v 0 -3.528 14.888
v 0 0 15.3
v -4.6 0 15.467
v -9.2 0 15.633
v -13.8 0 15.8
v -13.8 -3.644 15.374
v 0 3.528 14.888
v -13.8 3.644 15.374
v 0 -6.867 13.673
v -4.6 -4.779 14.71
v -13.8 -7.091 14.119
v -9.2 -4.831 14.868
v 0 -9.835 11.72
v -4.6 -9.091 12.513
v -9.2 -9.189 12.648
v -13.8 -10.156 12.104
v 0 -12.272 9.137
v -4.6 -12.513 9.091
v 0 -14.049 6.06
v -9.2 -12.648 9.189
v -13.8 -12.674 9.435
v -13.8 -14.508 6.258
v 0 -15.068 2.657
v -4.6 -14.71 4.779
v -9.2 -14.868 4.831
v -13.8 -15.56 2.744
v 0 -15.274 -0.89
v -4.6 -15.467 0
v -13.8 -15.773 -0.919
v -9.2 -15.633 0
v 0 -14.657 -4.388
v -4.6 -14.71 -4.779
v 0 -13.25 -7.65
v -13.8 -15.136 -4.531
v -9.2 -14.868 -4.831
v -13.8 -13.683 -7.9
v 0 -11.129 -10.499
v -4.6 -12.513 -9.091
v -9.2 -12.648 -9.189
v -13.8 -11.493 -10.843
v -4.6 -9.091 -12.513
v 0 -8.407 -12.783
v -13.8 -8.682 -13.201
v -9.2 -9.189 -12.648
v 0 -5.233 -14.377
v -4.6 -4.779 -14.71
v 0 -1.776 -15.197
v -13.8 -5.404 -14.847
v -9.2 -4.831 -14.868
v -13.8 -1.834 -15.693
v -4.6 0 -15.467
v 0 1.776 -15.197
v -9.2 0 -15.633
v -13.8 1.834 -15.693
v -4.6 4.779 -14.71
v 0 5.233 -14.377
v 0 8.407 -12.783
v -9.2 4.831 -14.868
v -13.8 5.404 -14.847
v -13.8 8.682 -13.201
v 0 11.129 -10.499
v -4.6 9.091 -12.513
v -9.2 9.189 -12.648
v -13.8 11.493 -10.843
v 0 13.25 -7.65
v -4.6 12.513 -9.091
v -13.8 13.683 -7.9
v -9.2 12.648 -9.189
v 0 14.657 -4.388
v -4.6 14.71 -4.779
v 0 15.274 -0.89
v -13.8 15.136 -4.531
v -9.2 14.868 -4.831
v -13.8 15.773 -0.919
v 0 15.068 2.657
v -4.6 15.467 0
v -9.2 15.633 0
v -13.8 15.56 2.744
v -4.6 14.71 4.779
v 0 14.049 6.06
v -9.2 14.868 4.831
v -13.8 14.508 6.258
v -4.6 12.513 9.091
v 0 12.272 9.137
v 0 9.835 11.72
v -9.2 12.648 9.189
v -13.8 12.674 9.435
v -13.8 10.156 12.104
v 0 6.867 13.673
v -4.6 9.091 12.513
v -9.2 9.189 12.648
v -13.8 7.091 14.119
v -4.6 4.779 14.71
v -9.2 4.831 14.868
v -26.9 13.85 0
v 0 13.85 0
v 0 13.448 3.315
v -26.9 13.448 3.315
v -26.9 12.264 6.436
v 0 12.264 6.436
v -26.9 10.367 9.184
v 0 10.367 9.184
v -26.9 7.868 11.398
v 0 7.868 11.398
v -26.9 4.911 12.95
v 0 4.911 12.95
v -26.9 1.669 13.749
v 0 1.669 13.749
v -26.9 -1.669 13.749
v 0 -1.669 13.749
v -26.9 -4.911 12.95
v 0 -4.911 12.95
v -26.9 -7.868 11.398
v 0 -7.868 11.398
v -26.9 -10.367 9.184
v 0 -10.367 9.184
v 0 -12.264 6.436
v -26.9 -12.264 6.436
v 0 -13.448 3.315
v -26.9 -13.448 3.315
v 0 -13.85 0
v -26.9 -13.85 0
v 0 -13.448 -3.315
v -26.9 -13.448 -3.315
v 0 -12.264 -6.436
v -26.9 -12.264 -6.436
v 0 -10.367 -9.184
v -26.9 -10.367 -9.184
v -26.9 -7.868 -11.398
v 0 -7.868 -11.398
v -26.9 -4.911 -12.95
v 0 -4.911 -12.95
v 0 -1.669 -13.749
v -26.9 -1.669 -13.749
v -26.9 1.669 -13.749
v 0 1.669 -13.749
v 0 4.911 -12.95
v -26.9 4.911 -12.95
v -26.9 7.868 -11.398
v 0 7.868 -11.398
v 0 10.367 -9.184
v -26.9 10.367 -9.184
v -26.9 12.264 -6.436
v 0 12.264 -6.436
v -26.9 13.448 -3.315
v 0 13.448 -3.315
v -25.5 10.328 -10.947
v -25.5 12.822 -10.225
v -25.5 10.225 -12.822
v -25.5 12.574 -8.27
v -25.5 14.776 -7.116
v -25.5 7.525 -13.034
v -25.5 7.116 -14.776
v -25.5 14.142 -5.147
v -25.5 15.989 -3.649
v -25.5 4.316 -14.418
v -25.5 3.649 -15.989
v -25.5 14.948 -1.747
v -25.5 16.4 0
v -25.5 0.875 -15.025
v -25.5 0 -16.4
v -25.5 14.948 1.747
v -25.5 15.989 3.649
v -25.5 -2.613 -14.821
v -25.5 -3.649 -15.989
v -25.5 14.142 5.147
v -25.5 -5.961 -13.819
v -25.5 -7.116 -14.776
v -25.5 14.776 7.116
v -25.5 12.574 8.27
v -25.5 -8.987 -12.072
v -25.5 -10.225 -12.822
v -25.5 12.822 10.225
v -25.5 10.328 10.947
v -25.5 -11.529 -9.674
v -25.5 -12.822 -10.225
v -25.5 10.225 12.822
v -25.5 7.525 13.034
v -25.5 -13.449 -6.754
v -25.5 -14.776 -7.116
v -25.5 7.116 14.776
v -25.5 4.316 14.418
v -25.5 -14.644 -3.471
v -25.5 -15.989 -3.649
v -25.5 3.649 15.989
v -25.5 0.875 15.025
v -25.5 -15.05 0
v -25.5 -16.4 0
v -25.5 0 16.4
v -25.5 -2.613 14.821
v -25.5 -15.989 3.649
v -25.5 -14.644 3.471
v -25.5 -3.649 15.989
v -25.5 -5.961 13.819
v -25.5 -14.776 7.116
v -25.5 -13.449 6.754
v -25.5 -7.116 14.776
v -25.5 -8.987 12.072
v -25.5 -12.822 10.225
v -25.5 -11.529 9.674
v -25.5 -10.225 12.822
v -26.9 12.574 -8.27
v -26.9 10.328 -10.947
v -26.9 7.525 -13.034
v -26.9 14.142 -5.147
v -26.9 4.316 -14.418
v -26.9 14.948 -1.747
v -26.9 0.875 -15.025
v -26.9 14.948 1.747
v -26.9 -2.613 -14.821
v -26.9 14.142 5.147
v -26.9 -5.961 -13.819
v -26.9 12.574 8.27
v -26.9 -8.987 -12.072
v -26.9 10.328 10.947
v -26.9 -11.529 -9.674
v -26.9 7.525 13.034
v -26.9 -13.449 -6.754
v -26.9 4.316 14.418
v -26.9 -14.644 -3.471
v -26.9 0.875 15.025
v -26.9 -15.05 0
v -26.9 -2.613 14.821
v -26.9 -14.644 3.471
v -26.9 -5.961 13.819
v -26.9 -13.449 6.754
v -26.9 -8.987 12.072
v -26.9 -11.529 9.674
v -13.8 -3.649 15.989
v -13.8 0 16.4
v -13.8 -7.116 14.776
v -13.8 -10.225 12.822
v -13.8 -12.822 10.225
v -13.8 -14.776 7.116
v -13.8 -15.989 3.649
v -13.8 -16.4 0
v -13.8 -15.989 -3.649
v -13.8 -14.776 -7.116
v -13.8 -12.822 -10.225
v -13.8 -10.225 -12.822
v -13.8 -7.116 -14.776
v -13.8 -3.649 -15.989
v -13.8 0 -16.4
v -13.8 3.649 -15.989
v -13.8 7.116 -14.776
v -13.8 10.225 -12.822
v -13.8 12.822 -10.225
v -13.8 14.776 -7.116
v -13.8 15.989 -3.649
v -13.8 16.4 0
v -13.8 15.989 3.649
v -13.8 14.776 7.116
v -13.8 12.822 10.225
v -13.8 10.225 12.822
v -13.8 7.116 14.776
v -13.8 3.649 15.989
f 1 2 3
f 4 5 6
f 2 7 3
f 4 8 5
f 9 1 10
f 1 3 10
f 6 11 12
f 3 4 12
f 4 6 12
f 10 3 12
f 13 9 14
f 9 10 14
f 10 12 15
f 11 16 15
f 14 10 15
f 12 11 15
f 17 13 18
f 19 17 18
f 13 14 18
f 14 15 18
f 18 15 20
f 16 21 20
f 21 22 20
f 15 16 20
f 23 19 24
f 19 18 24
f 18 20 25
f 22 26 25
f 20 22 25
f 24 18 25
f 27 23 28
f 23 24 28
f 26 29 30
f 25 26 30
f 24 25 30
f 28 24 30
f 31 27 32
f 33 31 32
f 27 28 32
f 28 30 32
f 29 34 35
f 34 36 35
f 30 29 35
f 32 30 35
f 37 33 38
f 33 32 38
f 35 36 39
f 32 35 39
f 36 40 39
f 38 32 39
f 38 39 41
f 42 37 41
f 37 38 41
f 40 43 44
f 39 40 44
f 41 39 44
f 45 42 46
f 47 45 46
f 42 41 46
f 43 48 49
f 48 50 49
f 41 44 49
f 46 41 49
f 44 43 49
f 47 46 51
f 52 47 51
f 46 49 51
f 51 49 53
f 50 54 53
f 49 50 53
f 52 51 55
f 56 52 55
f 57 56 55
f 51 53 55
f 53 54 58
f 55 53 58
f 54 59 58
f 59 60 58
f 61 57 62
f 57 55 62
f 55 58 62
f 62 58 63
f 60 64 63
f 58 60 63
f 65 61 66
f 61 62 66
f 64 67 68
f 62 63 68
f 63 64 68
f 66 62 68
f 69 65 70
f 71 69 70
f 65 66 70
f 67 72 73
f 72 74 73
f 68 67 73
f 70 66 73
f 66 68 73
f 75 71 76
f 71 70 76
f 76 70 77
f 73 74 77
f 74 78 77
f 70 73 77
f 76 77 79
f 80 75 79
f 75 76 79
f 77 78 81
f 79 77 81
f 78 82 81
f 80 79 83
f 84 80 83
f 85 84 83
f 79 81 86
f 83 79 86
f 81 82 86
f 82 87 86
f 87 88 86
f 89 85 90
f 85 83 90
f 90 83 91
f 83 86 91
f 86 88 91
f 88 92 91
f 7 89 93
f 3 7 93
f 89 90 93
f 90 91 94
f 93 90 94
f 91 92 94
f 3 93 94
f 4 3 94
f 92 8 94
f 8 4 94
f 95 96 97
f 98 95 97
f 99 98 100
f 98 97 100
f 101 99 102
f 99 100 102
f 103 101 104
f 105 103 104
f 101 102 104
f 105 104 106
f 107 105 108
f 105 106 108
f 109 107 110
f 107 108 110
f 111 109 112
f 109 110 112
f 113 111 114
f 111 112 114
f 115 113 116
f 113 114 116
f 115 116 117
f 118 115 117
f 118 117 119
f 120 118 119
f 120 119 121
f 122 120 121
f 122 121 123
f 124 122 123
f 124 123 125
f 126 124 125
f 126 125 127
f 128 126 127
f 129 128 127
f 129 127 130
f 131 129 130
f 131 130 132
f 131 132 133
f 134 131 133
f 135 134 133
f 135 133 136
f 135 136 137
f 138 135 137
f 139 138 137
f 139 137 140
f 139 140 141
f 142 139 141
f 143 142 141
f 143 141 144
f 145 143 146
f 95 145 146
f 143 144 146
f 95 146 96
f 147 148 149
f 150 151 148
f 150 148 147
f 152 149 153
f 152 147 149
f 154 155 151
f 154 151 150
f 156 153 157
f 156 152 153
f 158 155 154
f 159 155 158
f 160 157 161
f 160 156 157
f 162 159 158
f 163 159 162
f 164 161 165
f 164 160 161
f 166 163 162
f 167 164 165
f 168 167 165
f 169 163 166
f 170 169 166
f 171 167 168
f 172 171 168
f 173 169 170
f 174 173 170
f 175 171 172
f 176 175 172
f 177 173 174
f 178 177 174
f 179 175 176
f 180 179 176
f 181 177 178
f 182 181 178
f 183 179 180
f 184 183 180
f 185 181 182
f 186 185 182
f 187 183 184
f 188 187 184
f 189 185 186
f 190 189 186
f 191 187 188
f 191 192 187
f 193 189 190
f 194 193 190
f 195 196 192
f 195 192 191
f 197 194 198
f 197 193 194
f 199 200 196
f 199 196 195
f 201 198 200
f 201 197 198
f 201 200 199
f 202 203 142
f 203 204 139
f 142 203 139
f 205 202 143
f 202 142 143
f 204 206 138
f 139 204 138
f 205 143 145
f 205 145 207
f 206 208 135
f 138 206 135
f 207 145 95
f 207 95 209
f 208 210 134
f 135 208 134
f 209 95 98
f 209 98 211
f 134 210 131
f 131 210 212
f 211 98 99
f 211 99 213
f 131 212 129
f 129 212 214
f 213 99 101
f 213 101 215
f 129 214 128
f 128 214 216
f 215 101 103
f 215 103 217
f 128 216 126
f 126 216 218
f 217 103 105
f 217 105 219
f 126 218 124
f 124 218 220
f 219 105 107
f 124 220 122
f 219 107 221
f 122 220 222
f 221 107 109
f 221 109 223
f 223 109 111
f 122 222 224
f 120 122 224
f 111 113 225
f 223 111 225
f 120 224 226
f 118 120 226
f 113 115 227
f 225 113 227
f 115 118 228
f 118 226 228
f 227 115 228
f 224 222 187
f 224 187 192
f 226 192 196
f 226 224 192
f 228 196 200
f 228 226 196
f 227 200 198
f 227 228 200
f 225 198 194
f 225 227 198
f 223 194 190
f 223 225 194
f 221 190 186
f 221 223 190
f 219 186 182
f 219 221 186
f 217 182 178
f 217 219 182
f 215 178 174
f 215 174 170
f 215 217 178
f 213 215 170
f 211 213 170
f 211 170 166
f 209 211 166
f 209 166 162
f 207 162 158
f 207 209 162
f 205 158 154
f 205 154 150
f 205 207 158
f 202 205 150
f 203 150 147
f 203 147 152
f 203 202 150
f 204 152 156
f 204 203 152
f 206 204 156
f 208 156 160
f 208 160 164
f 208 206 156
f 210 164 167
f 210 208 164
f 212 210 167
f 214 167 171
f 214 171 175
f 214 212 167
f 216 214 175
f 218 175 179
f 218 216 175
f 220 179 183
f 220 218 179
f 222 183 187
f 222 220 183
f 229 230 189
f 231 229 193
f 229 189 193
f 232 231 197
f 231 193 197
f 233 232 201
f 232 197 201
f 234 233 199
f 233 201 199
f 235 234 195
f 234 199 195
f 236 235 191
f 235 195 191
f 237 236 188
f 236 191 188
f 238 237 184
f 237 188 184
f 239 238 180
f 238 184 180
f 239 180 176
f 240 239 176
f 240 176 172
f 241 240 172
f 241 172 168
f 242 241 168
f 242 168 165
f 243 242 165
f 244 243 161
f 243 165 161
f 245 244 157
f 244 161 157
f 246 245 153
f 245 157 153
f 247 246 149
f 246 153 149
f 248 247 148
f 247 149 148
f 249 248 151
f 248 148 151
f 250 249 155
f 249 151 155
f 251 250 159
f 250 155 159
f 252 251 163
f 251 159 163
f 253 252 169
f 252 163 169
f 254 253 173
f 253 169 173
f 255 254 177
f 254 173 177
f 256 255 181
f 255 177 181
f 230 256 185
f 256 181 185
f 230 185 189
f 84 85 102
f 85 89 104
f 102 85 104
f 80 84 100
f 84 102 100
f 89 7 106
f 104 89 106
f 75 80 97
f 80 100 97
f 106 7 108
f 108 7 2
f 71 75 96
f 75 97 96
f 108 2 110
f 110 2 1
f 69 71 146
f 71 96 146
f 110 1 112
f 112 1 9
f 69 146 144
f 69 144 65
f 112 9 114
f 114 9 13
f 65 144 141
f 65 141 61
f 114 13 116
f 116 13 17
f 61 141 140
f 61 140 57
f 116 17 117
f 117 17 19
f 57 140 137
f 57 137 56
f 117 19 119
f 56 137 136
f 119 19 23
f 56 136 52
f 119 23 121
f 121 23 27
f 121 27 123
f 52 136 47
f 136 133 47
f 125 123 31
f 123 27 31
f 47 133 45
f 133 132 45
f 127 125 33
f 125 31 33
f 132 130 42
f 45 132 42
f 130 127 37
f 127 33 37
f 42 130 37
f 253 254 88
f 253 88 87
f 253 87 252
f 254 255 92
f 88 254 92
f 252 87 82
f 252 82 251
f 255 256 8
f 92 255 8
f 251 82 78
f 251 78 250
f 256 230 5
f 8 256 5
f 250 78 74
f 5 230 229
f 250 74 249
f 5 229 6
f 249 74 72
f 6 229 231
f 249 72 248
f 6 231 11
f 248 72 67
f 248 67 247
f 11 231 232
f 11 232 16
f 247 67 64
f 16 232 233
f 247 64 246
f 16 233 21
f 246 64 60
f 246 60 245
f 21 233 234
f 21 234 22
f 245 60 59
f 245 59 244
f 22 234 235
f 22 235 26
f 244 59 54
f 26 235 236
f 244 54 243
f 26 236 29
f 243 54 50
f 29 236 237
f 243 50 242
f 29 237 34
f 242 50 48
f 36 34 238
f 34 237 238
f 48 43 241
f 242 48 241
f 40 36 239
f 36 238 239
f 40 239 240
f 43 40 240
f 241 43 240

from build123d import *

# Parameters (mm, degrees)
F2_R     = 13.85
F3_DEPTH = 26.901
F4_R     = 16.4
F4_R_2   = 15.05
F5_DEPTH = 1.4


with BuildPart() as f1:
    # F0 (on Front) → F1 (revolve)
    with BuildSketch(Plane.XZ):
        Polygon((-13.8, 16.4), (-26.9, 16.4), (-26.9, 0), (-13.8, 0), (-13.8, 15.8), align=None)
        Polygon((0, 15.3), (-13.8, 15.8), (-13.8, 0), (0, 0), align=None)
    revolve(axis=Axis((-20.35, 0, 0), (1, 0, 0)))

    # F2 (on face) → F3 (cut, through all)
    with BuildSketch(Plane.YZ):
        Circle(F2_R)
    extrude(amount=-F3_DEPTH, mode=Mode.SUBTRACT)

    # F4 (on face) → F5 (cut)
    with BuildSketch(Plane(origin=(-26.9, 0, 0), x_dir=(0, -1, 0), z_dir=(-1, 0, 0))):
        Circle(F4_R)
        Circle(F4_R_2, mode=Mode.SUBTRACT)
    extrude(amount=-F5_DEPTH, mode=Mode.SUBTRACT)


solid = f1.part
